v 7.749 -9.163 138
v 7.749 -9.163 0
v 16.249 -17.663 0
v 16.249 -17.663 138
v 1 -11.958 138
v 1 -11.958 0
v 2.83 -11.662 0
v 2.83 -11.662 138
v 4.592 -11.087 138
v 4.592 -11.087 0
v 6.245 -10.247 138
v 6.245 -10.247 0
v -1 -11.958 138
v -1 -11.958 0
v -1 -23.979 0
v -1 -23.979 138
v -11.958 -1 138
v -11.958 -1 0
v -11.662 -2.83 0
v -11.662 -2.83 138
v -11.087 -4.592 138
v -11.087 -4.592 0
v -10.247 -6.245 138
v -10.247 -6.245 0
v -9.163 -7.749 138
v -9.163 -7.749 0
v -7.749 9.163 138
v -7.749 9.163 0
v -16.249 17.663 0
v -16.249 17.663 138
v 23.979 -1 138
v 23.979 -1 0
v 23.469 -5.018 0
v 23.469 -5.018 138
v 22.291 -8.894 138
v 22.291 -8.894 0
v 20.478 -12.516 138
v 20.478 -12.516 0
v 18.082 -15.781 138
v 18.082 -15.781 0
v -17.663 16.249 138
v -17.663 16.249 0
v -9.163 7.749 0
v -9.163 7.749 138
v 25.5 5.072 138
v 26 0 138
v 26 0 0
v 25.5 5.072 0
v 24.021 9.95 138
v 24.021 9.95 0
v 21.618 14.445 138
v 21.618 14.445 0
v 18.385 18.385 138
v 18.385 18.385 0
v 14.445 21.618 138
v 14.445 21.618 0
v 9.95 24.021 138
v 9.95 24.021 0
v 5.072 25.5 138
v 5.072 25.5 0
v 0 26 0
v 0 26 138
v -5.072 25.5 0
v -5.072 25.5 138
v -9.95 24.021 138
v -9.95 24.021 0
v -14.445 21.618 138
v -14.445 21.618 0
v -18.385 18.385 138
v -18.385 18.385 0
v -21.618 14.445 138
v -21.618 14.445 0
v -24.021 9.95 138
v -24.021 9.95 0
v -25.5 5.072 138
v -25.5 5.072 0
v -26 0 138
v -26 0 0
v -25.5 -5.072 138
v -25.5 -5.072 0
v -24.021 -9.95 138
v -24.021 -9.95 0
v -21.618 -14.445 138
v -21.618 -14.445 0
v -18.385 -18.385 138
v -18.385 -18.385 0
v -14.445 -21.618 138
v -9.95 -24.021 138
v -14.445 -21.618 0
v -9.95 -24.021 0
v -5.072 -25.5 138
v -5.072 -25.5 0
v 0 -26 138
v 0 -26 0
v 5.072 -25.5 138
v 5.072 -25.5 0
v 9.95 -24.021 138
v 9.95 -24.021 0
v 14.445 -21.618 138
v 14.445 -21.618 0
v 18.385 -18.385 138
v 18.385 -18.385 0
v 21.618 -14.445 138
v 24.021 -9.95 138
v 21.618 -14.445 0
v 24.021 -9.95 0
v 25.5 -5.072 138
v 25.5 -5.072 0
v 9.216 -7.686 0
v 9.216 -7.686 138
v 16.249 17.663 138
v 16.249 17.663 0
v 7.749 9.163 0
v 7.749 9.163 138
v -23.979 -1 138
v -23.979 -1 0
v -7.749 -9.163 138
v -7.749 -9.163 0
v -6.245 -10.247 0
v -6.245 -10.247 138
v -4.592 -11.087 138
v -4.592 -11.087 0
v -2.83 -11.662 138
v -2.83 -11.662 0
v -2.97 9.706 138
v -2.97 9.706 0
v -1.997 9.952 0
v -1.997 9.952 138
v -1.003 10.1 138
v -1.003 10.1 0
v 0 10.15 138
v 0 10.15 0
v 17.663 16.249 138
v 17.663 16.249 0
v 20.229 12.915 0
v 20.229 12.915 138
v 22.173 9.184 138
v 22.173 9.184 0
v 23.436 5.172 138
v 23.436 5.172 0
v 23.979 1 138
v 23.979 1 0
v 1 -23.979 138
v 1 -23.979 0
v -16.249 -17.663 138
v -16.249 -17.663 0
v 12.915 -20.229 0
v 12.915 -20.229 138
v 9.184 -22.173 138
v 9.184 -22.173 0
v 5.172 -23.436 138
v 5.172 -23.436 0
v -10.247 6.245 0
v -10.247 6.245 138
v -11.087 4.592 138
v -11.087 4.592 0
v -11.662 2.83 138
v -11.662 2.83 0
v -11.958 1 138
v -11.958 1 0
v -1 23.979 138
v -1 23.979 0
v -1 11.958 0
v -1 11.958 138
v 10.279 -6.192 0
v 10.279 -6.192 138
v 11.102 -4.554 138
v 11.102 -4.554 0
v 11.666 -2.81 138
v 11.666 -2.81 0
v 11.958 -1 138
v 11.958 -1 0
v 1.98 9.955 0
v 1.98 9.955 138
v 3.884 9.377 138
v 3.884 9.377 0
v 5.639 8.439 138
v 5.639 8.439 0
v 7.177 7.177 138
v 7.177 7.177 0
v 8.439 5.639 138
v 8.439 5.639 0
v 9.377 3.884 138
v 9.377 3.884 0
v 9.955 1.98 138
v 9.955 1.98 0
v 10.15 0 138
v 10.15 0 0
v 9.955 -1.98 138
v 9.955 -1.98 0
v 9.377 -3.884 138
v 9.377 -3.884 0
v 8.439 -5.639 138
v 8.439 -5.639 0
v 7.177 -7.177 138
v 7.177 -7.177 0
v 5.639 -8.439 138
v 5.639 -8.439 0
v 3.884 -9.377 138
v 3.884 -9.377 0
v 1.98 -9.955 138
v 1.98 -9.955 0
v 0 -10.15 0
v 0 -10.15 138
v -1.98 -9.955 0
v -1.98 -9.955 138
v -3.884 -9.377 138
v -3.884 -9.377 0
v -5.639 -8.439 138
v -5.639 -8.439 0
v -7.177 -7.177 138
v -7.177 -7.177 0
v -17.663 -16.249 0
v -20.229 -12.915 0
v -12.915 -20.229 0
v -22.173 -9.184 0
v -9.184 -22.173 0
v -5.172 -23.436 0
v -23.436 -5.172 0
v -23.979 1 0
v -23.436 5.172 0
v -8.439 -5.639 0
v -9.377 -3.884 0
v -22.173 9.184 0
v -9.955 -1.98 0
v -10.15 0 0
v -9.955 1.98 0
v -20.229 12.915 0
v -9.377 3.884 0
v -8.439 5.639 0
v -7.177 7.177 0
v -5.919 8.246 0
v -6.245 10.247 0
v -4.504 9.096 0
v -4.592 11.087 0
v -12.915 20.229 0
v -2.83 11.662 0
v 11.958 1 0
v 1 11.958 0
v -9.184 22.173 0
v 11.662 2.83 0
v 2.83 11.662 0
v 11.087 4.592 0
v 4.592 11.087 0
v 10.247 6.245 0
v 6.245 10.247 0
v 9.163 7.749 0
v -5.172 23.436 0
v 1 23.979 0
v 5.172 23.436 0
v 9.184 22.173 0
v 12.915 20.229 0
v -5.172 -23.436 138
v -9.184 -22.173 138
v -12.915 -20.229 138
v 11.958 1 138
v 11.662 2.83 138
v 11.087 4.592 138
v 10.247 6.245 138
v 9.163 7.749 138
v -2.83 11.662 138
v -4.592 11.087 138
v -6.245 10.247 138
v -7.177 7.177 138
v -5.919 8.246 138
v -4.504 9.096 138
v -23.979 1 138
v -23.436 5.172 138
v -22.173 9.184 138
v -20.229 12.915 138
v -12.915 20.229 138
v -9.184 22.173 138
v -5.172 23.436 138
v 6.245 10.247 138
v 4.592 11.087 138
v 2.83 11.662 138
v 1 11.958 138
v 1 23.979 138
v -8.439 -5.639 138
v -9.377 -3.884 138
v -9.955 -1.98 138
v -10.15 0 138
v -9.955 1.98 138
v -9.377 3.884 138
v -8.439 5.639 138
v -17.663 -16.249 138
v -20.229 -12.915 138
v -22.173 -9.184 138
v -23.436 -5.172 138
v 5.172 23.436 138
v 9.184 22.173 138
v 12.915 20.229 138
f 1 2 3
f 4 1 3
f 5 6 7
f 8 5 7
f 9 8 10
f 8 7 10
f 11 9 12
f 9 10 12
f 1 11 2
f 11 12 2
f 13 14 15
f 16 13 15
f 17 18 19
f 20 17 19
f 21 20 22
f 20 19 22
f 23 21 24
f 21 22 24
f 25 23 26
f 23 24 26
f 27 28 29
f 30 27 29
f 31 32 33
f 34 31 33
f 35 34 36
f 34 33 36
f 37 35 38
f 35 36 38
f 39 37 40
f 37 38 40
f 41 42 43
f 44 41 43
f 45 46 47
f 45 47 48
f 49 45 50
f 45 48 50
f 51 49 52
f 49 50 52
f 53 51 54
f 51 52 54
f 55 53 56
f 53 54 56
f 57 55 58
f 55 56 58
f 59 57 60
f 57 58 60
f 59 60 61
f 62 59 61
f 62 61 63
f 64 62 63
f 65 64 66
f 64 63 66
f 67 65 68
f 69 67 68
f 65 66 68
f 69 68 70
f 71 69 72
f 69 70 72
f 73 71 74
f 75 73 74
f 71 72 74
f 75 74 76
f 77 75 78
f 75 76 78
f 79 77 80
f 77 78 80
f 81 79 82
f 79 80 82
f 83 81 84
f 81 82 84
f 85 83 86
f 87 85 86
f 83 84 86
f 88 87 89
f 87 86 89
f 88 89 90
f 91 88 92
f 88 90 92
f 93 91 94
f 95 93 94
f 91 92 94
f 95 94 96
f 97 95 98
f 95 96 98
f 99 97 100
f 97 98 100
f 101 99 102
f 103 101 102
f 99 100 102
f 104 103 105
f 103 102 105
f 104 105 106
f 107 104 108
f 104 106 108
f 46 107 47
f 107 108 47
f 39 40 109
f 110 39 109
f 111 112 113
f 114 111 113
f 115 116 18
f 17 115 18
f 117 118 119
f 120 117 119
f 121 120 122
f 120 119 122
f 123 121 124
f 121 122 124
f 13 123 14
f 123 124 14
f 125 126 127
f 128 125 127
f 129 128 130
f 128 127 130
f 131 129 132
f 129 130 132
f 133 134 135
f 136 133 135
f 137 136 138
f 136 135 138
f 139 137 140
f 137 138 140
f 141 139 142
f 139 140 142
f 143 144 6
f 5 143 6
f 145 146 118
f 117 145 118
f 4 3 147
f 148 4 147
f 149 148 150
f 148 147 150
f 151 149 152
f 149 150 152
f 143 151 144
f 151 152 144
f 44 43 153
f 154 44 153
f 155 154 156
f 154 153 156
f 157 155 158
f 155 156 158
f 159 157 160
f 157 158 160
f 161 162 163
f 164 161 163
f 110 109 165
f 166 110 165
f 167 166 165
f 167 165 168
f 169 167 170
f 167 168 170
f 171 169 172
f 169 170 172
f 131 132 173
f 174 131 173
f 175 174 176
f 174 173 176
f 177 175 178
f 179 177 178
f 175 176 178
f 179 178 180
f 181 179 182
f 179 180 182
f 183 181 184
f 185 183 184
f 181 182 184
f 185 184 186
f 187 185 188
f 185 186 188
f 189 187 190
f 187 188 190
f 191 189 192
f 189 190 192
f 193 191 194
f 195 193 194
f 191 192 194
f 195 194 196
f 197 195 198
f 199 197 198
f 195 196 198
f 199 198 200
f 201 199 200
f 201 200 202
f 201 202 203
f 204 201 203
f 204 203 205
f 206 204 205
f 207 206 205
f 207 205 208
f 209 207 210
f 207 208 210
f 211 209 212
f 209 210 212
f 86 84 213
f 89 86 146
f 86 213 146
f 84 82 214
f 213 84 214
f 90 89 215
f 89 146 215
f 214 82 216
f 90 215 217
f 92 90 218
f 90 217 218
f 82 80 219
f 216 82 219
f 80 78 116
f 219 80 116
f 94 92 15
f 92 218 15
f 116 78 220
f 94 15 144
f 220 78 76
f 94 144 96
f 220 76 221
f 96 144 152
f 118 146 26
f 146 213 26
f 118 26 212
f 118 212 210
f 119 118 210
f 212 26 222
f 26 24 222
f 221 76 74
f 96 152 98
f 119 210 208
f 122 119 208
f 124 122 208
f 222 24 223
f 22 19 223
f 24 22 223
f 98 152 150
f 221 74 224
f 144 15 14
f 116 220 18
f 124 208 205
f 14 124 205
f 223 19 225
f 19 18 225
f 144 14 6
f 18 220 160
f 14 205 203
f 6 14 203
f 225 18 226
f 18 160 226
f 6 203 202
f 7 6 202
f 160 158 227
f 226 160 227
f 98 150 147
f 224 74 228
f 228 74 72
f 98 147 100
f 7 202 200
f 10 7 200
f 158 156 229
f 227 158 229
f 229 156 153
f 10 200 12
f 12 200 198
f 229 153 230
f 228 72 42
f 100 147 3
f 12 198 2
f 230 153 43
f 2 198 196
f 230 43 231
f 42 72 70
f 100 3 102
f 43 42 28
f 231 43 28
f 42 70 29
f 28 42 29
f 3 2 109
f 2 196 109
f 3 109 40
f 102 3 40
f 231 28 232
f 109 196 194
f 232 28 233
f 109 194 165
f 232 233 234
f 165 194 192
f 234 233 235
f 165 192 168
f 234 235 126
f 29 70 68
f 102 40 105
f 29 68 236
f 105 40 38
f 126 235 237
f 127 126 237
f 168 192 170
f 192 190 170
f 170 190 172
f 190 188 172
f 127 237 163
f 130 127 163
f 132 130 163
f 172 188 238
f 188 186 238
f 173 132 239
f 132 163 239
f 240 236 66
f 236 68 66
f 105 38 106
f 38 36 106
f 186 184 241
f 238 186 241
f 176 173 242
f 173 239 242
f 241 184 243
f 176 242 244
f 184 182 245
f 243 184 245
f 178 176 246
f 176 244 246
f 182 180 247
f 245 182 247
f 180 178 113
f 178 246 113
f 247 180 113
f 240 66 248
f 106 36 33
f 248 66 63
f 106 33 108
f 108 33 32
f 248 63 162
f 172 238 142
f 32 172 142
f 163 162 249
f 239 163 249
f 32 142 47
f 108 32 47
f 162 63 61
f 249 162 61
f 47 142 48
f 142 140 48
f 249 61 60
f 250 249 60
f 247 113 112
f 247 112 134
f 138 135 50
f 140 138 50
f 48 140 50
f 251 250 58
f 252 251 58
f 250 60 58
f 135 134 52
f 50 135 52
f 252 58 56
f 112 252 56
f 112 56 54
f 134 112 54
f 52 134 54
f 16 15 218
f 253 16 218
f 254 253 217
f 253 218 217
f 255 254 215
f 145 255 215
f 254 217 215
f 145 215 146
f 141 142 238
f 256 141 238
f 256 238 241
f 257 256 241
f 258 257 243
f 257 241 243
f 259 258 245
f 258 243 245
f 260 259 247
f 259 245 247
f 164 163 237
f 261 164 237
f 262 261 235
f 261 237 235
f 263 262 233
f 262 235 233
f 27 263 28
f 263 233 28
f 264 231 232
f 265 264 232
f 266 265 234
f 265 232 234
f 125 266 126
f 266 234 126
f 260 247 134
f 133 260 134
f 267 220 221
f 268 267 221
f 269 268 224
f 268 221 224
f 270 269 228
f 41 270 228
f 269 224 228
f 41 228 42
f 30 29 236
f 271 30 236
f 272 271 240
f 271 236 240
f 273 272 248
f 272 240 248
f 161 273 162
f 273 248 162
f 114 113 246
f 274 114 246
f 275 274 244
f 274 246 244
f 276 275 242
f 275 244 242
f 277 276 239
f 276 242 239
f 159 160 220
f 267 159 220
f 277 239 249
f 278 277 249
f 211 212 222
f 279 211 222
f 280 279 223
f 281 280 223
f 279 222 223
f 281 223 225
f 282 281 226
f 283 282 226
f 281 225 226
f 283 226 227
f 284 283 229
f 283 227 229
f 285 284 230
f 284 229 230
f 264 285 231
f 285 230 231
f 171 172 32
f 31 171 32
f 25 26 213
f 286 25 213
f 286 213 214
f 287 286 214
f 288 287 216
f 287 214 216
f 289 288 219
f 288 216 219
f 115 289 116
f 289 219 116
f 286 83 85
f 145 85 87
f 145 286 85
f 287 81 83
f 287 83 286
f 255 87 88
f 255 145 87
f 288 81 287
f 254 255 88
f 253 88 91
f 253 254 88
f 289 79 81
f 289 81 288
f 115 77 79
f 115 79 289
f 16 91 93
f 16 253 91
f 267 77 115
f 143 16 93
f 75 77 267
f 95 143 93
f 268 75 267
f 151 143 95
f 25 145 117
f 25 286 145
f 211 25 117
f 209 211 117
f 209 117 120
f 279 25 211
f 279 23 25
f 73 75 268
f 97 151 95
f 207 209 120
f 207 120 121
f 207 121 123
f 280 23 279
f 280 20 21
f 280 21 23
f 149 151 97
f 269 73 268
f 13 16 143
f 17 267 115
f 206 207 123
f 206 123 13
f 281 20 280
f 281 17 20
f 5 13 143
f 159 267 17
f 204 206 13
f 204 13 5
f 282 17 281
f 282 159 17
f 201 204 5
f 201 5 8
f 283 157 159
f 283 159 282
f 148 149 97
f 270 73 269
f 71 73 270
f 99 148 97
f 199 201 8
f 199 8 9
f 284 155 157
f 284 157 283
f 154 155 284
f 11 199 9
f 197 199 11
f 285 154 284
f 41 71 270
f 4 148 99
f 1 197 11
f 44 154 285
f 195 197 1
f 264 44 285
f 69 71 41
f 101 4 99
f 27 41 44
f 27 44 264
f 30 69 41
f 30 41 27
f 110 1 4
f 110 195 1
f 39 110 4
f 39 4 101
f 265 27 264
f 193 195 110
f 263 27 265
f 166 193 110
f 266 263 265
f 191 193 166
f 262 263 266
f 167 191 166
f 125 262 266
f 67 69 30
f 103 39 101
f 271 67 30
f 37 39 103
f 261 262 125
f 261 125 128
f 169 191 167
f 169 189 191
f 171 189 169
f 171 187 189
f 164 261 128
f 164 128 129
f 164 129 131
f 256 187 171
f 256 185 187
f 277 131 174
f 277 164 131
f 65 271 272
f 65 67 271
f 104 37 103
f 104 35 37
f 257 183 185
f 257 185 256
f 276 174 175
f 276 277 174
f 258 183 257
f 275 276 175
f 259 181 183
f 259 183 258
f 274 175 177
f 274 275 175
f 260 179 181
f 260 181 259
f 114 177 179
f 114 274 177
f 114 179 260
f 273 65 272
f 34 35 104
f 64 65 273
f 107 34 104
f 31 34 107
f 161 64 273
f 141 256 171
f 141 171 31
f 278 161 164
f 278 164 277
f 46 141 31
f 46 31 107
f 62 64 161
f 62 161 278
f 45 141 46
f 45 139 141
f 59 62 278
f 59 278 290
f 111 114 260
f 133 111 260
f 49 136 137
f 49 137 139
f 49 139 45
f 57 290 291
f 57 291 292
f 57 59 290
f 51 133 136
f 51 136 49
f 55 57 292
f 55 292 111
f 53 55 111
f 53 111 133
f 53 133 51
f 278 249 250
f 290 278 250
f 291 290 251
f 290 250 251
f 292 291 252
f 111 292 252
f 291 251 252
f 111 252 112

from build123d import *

# Parameters (mm, degrees)
F0_R     = 26
F1_DEPTH = 138


with BuildPart() as f1:
    # F0 (on Top) → F1 (new body)
    with BuildSketch(Plane.XY):
        Circle(F0_R)
        with BuildLine():
            ThreePointArc((16.704727, -17.232298), (16.478129, -17.449105), (16.248718, -17.662932))
            ThreePointArc((16.248718, -17.662932), (9.184402, -22.173109), (1, -23.979158))
            ThreePointArc((1, -23.979158), (0, -24), (-1, -23.979158))
            ThreePointArc((-1, -23.979158), (-9.184402, -22.173109), (-16.248718, -17.662932))
            ThreePointArc((-16.248718, -17.662932), (-16.970563, -16.970563), (-17.662932, -16.248718))
            ThreePointArc((-17.662932, -16.248718), (-22.173109, -9.184402), (-23.979158, -1))
            ThreePointArc((-23.979158, -1), (-24, 0), (-23.979158, 1))
            ThreePointArc((-23.979158, 1), (-22.173109, 9.184402), (-17.662932, 16.248718))
            ThreePointArc((-17.662932, 16.248718), (-16.970563, 16.970563), (-16.248718, 17.662932))
            ThreePointArc((-16.248718, 17.662932), (-9.184402, 22.173109), (-1, 23.979158))
            ThreePointArc((-1, 23.979158), (0, 24), (1, 23.979158))
            ThreePointArc((1, 23.979158), (9.184402, 22.173109), (16.248718, 17.662932))
            ThreePointArc((16.248718, 17.662932), (16.970563, 16.970563), (17.662932, 16.248718))
            ThreePointArc((17.662932, 16.248718), (22.173109, 9.184402), (23.979158, 1))
            ThreePointArc((23.979158, 1), (23.994789, 0.500109), (24, 0))
            ThreePointArc((24, 0), (23.994789, -0.500109), (23.979158, -1))
            ThreePointArc((23.979158, -1), (22.291296, -8.893714), (18.081746, -15.781332))
            ThreePointArc((18.081746, -15.781332), (17.40836, -16.521168), (16.704727, -17.232298))
        make_face(mode=Mode.SUBTRACT)
        with BuildLine():
            ThreePointArc((9.215691, -7.685769), (8.514268, -8.456195), (7.74866, -9.162874))
            Line((7.74866, -9.162874), (16.248718, -17.662932))
            ThreePointArc((16.248718, -17.662932), (16.478129, -17.449105), (16.704727, -17.232298))
            ThreePointArc((16.704727, -17.232298), (17.40836, -16.521168), (18.081746, -15.781332))
            Line((18.081746, -15.781332), (9.215691, -7.685769))
        make_face()
        with BuildLine():
            Line((-16.248718, -17.662932), (-7.74866, -9.162874))
            ThreePointArc((-7.74866, -9.162874), (-8.485281, -8.485281), (-9.162874, -7.74866))
            Line((-9.162874, -7.74866), (-17.662932, -16.248718))
            ThreePointArc((-17.662932, -16.248718), (-16.970563, -16.970563), (-16.248718, -17.662932))
        make_face()
        with BuildLine():
            ThreePointArc((1, -11.958261), (4.592201, -11.086554), (7.74866, -9.162874))
            ThreePointArc((7.74866, -9.162874), (8.514268, -8.456195), (9.215691, -7.685769))
            ThreePointArc((9.215691, -7.685769), (11.102204, -4.554236), (11.958261, -1))
            ThreePointArc((11.958261, -1), (11.989561, -0.500435), (12, 0))
            ThreePointArc((12, 0), (11.989561, 0.500435), (11.958261, 1))
            ThreePointArc((11.958261, 1), (11.086554, 4.592201), (9.162874, 7.74866))
            ThreePointArc((9.162874, 7.74866), (8.485281, 8.485281), (7.74866, 9.162874))
            ThreePointArc((7.74866, 9.162874), (4.592201, 11.086554), (1, 11.958261))
            ThreePointArc((1, 11.958261), (0, 12), (-1, 11.958261))
            ThreePointArc((-1, 11.958261), (-4.592201, 11.086554), (-7.74866, 9.162874))
            ThreePointArc((-7.74866, 9.162874), (-8.485281, 8.485281), (-9.162874, 7.74866))
            ThreePointArc((-9.162874, 7.74866), (-11.086554, 4.592201), (-11.958261, 1))
            ThreePointArc((-11.958261, 1), (-12, 0), (-11.958261, -1))
            ThreePointArc((-11.958261, -1), (-11.086554, -4.592201), (-9.162874, -7.74866))
            ThreePointArc((-9.162874, -7.74866), (-8.485281, -8.485281), (-7.74866, -9.162874))
            ThreePointArc((-7.74866, -9.162874), (-4.592201, -11.086554), (-1, -11.958261))
            ThreePointArc((-1, -11.958261), (0, -12), (1, -11.958261))
        make_face()
        with BuildLine():
            ThreePointArc((-7.177134, -7.177134), (-10.15, 0), (-7.177134, 7.177134))
            ThreePointArc((-7.177134, 7.177134), (-5.22891, 8.699483), (-2.970415, 9.705624))
            ThreePointArc((-2.970415, 9.705624), (-1.501735, 10.038291), (0, 10.15))
            ThreePointArc((0, 10.15), (9.377377, -3.884237), (-7.177134, -7.177134))
        make_face(mode=Mode.SUBTRACT)
        with BuildLine():
            Line((1, -23.979158), (1, -11.958261))
            ThreePointArc((1, -11.958261), (0, -12), (-1, -11.958261))
            Line((-1, -11.958261), (-1, -23.979158))
            ThreePointArc((-1, -23.979158), (0, -24), (1, -23.979158))
        make_face()
        with BuildLine():
            ThreePointArc((12, 0), (11.989561, -0.500435), (11.958261, -1))
            Line((11.958261, -1), (23.979158, -1))
            ThreePointArc((23.979158, -1), (23.994789, -0.500109), (24, 0))
            ThreePointArc((24, 0), (23.994789, 0.500109), (23.979158, 1))
            Line((23.979158, 1), (11.958261, 1))
            ThreePointArc((11.958261, 1), (11.989561, 0.500435), (12, 0))
        make_face()
        with BuildLine():
            ThreePointArc((7.74866, 9.162874), (8.485281, 8.485281), (9.162874, 7.74866))
            Line((9.162874, 7.74866), (17.662932, 16.248718))
            ThreePointArc((17.662932, 16.248718), (16.970563, 16.970563), (16.248718, 17.662932))
            Line((16.248718, 17.662932), (7.74866, 9.162874))
        make_face()
        with BuildLine():
            ThreePointArc((-1, 11.958261), (0, 12), (1, 11.958261))
            Line((1, 11.958261), (1, 23.979158))
            ThreePointArc((1, 23.979158), (0, 24), (-1, 23.979158))
            Line((-1, 23.979158), (-1, 11.958261))
        make_face()
        with BuildLine():
            Line((-17.662932, 16.248718), (-9.162874, 7.74866))
            ThreePointArc((-9.162874, 7.74866), (-8.485281, 8.485281), (-7.74866, 9.162874))
            Line((-7.74866, 9.162874), (-16.248718, 17.662932))
            ThreePointArc((-16.248718, 17.662932), (-16.970563, 16.970563), (-17.662932, 16.248718))
        make_face()
        with BuildLine():
            Line((-23.979158, -1), (-11.958261, -1))
            ThreePointArc((-11.958261, -1), (-12, 0), (-11.958261, 1))
            Line((-11.958261, 1), (-23.979158, 1))
            ThreePointArc((-23.979158, 1), (-24, 0), (-23.979158, -1))
        make_face()
    extrude(amount=F1_DEPTH)


solid = f1.part
